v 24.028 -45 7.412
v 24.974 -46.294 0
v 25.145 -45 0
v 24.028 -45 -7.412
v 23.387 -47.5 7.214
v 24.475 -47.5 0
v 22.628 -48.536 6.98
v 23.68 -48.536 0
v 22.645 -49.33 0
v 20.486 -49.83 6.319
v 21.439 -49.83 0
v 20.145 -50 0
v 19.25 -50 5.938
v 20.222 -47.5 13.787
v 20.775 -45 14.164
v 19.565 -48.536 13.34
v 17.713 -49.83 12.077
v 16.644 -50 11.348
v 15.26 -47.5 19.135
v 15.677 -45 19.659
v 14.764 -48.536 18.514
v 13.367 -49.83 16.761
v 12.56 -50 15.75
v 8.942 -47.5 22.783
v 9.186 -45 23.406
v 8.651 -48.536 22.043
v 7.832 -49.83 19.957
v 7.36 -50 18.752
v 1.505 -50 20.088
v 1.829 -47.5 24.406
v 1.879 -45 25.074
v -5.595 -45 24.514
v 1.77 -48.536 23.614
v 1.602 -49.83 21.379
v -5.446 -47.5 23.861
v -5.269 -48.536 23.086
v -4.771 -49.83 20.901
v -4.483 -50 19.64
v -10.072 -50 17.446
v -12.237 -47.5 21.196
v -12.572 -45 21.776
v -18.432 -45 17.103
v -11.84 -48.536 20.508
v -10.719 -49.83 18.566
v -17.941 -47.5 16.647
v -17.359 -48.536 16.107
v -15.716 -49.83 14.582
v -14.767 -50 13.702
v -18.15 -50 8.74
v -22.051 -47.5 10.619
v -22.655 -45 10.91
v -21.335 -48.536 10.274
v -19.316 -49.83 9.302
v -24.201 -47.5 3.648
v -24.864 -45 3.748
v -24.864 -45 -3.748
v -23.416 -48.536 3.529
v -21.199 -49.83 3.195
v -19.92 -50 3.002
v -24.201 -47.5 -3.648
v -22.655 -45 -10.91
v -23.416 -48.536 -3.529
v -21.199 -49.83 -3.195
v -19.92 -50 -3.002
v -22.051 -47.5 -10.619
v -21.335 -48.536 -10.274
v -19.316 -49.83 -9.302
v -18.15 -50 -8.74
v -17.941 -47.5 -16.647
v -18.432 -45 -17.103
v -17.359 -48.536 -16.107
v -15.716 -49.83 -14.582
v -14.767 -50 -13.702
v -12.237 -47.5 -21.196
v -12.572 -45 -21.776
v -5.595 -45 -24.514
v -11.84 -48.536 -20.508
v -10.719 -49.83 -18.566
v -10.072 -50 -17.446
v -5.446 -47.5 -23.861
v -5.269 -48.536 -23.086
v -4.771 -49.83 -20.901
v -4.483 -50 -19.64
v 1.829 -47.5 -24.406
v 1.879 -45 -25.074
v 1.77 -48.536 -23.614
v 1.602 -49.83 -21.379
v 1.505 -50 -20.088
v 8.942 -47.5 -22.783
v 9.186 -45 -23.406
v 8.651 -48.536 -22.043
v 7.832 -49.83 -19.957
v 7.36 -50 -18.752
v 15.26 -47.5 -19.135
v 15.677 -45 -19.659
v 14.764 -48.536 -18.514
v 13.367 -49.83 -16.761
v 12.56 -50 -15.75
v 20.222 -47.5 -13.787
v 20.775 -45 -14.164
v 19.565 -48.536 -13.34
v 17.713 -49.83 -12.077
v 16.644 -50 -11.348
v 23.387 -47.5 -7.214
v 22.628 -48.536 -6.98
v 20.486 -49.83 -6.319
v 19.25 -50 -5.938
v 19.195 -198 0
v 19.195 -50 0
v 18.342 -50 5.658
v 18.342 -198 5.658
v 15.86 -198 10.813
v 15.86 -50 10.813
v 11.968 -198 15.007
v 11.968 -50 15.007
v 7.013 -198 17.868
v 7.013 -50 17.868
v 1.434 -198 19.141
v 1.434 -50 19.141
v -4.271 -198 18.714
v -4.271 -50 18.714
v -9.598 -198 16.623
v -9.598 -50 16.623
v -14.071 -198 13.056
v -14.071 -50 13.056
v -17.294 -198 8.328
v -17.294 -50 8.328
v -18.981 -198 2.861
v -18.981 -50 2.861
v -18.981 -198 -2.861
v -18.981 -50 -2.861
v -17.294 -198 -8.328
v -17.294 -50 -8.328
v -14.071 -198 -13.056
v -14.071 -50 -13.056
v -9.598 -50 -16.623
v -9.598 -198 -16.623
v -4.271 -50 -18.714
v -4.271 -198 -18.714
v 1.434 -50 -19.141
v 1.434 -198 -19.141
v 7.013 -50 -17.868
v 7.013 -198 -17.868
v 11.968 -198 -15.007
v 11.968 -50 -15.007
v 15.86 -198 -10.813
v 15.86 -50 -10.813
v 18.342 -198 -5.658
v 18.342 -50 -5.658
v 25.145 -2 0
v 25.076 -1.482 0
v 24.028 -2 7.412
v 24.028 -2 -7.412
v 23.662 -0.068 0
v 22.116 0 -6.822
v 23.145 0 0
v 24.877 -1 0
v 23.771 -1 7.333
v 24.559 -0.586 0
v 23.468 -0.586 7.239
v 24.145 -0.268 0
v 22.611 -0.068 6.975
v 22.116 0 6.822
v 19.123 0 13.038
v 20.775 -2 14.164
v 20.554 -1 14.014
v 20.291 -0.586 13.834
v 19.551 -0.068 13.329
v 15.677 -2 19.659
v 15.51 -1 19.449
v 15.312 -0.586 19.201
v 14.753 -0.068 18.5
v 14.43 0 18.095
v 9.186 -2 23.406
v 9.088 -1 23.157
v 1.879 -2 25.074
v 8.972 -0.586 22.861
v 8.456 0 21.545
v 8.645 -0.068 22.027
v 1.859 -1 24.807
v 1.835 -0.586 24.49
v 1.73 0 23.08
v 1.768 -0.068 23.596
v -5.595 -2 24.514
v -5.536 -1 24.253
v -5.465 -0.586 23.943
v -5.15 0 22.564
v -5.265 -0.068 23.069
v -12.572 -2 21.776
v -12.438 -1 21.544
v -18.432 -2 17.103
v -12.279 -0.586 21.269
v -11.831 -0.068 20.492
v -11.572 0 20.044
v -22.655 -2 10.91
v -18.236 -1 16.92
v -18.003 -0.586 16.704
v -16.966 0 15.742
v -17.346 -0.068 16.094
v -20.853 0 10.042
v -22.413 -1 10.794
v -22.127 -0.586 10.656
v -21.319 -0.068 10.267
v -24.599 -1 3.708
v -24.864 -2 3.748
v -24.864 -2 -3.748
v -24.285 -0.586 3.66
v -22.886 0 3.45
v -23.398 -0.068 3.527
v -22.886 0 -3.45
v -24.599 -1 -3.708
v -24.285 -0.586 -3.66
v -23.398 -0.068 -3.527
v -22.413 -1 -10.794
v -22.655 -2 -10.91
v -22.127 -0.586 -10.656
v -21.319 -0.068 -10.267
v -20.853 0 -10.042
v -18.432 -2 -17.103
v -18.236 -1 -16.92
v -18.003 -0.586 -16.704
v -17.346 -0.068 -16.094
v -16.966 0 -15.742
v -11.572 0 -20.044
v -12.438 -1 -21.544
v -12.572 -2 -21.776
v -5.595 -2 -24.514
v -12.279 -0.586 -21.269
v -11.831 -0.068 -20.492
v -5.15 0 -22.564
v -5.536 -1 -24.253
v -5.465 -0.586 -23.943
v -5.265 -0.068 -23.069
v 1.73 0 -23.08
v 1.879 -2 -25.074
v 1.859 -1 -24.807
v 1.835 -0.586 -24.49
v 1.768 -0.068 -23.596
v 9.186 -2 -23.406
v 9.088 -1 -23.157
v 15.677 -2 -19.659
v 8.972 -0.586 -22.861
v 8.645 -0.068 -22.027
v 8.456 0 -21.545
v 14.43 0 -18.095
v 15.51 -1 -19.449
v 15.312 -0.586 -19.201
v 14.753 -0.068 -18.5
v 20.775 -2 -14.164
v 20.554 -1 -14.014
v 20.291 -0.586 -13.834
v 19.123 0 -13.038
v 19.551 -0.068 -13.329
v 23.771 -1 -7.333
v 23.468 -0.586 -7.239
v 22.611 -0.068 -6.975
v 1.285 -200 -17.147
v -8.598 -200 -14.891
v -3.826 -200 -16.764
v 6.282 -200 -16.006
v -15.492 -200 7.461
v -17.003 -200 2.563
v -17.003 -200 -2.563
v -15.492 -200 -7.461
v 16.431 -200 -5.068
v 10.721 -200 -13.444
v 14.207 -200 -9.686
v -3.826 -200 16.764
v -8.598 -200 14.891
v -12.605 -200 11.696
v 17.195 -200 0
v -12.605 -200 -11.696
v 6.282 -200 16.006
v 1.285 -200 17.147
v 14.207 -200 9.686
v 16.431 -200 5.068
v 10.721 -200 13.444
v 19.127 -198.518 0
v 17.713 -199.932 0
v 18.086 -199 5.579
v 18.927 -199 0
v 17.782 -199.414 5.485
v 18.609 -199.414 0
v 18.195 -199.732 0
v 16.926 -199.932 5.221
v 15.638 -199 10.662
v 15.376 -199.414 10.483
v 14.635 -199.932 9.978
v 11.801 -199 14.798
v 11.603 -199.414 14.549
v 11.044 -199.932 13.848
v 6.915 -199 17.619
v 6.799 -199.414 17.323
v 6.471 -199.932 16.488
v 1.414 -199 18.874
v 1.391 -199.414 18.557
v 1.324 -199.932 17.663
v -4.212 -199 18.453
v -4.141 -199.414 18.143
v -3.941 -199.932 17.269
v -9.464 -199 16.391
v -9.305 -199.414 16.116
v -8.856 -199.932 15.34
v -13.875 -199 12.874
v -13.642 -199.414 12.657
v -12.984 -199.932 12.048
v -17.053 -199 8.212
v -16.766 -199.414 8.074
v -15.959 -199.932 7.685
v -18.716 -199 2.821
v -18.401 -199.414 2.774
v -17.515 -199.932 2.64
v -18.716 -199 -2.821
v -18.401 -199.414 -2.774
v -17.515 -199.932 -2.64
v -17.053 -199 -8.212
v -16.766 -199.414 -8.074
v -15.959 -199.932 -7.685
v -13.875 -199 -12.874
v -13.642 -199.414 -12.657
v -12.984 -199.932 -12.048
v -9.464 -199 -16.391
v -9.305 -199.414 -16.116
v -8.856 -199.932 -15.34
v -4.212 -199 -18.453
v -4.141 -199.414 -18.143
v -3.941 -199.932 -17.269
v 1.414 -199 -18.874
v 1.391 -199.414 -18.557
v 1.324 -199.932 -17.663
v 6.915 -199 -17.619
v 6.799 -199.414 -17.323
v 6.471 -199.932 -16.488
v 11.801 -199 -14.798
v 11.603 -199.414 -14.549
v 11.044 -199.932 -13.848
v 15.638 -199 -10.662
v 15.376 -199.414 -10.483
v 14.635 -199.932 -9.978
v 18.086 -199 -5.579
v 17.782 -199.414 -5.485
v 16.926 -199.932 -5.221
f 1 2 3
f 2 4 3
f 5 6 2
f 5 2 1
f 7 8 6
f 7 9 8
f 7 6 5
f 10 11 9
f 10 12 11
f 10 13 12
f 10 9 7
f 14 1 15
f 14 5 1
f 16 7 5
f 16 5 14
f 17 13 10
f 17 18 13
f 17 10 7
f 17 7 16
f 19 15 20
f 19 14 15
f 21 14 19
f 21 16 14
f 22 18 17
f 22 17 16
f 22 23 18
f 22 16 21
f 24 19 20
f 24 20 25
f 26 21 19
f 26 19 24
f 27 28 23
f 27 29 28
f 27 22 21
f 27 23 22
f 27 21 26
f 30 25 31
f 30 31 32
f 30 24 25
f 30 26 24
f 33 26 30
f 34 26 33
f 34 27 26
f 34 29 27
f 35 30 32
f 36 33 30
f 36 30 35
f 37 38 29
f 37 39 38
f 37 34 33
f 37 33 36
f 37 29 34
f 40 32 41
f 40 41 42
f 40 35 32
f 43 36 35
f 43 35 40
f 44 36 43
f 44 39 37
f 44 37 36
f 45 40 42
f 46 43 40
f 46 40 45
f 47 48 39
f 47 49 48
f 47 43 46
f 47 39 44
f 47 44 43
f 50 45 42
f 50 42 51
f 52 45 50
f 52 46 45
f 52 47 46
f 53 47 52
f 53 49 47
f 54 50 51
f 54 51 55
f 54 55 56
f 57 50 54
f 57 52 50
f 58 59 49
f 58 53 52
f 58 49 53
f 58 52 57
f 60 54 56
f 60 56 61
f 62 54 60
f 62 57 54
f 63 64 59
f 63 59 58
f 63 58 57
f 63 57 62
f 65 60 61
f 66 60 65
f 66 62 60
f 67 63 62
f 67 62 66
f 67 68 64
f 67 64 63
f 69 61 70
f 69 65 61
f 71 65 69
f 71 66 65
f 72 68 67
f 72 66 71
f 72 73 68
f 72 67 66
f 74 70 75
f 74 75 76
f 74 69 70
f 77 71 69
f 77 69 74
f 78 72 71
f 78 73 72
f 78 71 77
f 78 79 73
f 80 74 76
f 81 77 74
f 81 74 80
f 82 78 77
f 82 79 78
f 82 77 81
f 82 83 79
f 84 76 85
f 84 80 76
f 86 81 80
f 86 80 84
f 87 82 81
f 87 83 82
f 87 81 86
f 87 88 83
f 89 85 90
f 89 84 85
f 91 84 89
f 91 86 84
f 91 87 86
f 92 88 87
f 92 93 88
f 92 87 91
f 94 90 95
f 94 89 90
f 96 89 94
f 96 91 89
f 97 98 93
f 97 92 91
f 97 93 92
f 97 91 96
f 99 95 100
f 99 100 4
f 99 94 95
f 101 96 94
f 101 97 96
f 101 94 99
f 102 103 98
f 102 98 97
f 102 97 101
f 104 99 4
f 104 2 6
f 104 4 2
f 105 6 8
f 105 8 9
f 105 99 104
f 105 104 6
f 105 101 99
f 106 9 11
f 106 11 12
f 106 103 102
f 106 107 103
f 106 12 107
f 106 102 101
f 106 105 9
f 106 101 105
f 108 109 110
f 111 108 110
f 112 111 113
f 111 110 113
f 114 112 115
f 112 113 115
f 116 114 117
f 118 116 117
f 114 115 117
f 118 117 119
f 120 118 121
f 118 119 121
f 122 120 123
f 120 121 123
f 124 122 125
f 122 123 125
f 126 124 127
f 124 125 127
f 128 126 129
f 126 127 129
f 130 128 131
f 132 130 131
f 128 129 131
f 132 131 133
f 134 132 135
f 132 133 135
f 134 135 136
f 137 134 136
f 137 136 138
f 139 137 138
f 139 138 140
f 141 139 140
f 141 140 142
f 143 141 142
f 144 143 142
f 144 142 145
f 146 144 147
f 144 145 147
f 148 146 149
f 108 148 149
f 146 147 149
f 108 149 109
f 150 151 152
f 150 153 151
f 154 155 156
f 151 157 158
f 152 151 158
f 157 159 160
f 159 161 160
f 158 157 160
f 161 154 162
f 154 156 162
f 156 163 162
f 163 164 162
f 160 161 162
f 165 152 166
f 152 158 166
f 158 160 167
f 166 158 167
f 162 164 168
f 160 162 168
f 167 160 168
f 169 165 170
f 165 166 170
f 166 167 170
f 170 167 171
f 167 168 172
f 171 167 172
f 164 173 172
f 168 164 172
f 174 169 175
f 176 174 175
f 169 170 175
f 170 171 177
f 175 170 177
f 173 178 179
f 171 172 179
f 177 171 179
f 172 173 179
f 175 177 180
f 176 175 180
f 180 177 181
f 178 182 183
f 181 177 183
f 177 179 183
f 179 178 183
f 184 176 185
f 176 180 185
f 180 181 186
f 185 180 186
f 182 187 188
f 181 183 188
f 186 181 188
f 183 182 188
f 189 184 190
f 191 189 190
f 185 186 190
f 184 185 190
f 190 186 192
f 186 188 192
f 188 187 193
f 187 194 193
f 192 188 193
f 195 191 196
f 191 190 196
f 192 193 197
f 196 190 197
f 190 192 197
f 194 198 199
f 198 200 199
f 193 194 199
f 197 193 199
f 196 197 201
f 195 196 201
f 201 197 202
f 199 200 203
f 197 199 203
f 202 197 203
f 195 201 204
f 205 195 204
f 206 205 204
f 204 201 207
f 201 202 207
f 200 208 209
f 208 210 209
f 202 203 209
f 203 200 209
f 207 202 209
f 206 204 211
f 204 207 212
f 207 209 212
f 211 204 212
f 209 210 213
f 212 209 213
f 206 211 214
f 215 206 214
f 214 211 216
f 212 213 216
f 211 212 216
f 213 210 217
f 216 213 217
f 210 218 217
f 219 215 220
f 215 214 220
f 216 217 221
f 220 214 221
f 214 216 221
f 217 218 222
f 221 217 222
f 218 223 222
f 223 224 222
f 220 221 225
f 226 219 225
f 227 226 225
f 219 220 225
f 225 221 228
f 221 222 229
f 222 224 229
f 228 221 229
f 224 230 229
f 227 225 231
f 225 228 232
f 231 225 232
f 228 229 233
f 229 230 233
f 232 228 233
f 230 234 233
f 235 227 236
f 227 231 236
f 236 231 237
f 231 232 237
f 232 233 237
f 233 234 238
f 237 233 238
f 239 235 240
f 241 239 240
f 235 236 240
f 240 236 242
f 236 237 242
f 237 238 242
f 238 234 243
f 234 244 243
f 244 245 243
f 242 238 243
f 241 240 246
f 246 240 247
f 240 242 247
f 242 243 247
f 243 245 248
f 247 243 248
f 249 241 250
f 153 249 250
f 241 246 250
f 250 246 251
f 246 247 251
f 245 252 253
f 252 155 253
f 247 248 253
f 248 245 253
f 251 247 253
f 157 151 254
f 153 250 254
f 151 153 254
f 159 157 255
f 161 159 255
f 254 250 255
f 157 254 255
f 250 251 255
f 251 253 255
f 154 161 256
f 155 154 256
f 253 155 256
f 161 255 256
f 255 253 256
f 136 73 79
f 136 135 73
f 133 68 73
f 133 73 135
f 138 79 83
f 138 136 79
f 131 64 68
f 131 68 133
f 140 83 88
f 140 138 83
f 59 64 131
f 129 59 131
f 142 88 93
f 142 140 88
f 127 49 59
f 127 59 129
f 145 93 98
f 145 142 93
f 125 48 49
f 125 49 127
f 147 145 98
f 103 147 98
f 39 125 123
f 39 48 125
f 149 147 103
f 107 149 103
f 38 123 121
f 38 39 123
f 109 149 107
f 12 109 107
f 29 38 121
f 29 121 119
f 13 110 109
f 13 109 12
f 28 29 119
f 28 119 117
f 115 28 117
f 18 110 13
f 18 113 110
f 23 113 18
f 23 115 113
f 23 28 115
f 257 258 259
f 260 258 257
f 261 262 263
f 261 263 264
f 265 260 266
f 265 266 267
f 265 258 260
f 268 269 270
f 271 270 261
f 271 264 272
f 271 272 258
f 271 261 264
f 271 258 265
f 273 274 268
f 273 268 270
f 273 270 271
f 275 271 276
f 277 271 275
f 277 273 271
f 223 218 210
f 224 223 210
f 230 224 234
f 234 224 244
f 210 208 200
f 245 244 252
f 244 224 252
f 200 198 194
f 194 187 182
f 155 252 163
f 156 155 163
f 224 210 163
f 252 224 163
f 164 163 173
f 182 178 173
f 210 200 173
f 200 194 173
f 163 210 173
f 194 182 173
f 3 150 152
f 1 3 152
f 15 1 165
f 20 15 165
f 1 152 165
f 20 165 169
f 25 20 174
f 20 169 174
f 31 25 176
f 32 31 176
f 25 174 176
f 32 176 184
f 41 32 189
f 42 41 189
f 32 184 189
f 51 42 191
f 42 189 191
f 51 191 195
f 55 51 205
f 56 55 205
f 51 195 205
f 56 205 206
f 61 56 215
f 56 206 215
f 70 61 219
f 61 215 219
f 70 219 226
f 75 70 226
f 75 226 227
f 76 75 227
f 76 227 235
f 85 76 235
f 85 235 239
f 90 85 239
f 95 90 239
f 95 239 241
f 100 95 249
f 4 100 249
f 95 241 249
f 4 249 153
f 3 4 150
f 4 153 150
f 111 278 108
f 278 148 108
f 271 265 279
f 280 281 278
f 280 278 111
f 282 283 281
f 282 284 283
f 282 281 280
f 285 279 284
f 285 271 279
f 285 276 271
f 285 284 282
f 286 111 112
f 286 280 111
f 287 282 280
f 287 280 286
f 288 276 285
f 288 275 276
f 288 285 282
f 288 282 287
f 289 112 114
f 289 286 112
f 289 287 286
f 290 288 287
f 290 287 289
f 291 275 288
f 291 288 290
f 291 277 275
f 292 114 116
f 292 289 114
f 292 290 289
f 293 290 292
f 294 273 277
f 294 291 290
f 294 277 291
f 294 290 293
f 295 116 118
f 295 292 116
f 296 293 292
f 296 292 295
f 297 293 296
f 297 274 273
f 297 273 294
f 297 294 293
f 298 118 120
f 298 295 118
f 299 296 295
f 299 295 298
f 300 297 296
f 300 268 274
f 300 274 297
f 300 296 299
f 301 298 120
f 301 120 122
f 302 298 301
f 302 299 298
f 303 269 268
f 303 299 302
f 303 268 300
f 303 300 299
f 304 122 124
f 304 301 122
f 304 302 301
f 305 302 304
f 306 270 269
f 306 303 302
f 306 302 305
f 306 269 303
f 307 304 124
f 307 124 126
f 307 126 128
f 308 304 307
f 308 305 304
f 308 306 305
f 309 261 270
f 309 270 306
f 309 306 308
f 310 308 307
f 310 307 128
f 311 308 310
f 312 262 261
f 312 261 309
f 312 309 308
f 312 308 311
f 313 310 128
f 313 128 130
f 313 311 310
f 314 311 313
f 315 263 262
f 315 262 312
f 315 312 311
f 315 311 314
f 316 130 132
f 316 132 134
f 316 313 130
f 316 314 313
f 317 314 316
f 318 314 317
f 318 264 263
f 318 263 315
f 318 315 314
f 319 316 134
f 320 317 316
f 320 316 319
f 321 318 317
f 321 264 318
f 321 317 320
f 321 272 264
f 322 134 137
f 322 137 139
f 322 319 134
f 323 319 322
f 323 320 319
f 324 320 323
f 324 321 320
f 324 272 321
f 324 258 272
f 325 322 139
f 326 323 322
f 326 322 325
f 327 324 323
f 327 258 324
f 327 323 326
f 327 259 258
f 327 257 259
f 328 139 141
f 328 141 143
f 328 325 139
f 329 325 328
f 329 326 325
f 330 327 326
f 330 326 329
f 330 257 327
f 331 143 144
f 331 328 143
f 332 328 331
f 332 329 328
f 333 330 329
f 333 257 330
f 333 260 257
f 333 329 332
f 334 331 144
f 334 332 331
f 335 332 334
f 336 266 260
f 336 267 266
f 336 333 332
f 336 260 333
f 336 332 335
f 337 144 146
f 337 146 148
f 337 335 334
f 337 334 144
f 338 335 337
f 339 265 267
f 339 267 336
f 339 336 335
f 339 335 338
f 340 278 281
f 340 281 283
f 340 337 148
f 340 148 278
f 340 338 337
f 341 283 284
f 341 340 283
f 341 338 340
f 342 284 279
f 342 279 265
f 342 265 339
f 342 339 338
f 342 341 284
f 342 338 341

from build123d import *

# Parameters (mm, degrees)
F0_R     = 25.14462
F1_DEPTH = 50
F2_R     = 19.195006
F3_DEPTH = 150
F4_R     = 2
F5_R     = 5


with BuildPart() as f1:
    # F0 (on Front) → F1 (new body)
    with BuildSketch(Plane.XZ):
        Circle(F0_R)
    extrude(amount=F1_DEPTH)

    # F2 (on face) → F3 (join)
    with BuildSketch(Plane.XZ.offset(50)):
        Circle(F2_R)
    extrude(amount=F3_DEPTH)

    # F4
    f4_edges = [f1.edges().sort_by_distance(p)[0] for p in [
        (-19.195006, -200, 0),
        (-25.14462, 0, 0),
    ]]
    fillet(f4_edges, radius=F4_R)

    # F5
    f5_edges = [f1.edges().sort_by_distance(p)[0] for p in [
        (-25.14462, -50, 0),
    ]]
    fillet(f5_edges, radius=F5_R)


solid = f1.part
